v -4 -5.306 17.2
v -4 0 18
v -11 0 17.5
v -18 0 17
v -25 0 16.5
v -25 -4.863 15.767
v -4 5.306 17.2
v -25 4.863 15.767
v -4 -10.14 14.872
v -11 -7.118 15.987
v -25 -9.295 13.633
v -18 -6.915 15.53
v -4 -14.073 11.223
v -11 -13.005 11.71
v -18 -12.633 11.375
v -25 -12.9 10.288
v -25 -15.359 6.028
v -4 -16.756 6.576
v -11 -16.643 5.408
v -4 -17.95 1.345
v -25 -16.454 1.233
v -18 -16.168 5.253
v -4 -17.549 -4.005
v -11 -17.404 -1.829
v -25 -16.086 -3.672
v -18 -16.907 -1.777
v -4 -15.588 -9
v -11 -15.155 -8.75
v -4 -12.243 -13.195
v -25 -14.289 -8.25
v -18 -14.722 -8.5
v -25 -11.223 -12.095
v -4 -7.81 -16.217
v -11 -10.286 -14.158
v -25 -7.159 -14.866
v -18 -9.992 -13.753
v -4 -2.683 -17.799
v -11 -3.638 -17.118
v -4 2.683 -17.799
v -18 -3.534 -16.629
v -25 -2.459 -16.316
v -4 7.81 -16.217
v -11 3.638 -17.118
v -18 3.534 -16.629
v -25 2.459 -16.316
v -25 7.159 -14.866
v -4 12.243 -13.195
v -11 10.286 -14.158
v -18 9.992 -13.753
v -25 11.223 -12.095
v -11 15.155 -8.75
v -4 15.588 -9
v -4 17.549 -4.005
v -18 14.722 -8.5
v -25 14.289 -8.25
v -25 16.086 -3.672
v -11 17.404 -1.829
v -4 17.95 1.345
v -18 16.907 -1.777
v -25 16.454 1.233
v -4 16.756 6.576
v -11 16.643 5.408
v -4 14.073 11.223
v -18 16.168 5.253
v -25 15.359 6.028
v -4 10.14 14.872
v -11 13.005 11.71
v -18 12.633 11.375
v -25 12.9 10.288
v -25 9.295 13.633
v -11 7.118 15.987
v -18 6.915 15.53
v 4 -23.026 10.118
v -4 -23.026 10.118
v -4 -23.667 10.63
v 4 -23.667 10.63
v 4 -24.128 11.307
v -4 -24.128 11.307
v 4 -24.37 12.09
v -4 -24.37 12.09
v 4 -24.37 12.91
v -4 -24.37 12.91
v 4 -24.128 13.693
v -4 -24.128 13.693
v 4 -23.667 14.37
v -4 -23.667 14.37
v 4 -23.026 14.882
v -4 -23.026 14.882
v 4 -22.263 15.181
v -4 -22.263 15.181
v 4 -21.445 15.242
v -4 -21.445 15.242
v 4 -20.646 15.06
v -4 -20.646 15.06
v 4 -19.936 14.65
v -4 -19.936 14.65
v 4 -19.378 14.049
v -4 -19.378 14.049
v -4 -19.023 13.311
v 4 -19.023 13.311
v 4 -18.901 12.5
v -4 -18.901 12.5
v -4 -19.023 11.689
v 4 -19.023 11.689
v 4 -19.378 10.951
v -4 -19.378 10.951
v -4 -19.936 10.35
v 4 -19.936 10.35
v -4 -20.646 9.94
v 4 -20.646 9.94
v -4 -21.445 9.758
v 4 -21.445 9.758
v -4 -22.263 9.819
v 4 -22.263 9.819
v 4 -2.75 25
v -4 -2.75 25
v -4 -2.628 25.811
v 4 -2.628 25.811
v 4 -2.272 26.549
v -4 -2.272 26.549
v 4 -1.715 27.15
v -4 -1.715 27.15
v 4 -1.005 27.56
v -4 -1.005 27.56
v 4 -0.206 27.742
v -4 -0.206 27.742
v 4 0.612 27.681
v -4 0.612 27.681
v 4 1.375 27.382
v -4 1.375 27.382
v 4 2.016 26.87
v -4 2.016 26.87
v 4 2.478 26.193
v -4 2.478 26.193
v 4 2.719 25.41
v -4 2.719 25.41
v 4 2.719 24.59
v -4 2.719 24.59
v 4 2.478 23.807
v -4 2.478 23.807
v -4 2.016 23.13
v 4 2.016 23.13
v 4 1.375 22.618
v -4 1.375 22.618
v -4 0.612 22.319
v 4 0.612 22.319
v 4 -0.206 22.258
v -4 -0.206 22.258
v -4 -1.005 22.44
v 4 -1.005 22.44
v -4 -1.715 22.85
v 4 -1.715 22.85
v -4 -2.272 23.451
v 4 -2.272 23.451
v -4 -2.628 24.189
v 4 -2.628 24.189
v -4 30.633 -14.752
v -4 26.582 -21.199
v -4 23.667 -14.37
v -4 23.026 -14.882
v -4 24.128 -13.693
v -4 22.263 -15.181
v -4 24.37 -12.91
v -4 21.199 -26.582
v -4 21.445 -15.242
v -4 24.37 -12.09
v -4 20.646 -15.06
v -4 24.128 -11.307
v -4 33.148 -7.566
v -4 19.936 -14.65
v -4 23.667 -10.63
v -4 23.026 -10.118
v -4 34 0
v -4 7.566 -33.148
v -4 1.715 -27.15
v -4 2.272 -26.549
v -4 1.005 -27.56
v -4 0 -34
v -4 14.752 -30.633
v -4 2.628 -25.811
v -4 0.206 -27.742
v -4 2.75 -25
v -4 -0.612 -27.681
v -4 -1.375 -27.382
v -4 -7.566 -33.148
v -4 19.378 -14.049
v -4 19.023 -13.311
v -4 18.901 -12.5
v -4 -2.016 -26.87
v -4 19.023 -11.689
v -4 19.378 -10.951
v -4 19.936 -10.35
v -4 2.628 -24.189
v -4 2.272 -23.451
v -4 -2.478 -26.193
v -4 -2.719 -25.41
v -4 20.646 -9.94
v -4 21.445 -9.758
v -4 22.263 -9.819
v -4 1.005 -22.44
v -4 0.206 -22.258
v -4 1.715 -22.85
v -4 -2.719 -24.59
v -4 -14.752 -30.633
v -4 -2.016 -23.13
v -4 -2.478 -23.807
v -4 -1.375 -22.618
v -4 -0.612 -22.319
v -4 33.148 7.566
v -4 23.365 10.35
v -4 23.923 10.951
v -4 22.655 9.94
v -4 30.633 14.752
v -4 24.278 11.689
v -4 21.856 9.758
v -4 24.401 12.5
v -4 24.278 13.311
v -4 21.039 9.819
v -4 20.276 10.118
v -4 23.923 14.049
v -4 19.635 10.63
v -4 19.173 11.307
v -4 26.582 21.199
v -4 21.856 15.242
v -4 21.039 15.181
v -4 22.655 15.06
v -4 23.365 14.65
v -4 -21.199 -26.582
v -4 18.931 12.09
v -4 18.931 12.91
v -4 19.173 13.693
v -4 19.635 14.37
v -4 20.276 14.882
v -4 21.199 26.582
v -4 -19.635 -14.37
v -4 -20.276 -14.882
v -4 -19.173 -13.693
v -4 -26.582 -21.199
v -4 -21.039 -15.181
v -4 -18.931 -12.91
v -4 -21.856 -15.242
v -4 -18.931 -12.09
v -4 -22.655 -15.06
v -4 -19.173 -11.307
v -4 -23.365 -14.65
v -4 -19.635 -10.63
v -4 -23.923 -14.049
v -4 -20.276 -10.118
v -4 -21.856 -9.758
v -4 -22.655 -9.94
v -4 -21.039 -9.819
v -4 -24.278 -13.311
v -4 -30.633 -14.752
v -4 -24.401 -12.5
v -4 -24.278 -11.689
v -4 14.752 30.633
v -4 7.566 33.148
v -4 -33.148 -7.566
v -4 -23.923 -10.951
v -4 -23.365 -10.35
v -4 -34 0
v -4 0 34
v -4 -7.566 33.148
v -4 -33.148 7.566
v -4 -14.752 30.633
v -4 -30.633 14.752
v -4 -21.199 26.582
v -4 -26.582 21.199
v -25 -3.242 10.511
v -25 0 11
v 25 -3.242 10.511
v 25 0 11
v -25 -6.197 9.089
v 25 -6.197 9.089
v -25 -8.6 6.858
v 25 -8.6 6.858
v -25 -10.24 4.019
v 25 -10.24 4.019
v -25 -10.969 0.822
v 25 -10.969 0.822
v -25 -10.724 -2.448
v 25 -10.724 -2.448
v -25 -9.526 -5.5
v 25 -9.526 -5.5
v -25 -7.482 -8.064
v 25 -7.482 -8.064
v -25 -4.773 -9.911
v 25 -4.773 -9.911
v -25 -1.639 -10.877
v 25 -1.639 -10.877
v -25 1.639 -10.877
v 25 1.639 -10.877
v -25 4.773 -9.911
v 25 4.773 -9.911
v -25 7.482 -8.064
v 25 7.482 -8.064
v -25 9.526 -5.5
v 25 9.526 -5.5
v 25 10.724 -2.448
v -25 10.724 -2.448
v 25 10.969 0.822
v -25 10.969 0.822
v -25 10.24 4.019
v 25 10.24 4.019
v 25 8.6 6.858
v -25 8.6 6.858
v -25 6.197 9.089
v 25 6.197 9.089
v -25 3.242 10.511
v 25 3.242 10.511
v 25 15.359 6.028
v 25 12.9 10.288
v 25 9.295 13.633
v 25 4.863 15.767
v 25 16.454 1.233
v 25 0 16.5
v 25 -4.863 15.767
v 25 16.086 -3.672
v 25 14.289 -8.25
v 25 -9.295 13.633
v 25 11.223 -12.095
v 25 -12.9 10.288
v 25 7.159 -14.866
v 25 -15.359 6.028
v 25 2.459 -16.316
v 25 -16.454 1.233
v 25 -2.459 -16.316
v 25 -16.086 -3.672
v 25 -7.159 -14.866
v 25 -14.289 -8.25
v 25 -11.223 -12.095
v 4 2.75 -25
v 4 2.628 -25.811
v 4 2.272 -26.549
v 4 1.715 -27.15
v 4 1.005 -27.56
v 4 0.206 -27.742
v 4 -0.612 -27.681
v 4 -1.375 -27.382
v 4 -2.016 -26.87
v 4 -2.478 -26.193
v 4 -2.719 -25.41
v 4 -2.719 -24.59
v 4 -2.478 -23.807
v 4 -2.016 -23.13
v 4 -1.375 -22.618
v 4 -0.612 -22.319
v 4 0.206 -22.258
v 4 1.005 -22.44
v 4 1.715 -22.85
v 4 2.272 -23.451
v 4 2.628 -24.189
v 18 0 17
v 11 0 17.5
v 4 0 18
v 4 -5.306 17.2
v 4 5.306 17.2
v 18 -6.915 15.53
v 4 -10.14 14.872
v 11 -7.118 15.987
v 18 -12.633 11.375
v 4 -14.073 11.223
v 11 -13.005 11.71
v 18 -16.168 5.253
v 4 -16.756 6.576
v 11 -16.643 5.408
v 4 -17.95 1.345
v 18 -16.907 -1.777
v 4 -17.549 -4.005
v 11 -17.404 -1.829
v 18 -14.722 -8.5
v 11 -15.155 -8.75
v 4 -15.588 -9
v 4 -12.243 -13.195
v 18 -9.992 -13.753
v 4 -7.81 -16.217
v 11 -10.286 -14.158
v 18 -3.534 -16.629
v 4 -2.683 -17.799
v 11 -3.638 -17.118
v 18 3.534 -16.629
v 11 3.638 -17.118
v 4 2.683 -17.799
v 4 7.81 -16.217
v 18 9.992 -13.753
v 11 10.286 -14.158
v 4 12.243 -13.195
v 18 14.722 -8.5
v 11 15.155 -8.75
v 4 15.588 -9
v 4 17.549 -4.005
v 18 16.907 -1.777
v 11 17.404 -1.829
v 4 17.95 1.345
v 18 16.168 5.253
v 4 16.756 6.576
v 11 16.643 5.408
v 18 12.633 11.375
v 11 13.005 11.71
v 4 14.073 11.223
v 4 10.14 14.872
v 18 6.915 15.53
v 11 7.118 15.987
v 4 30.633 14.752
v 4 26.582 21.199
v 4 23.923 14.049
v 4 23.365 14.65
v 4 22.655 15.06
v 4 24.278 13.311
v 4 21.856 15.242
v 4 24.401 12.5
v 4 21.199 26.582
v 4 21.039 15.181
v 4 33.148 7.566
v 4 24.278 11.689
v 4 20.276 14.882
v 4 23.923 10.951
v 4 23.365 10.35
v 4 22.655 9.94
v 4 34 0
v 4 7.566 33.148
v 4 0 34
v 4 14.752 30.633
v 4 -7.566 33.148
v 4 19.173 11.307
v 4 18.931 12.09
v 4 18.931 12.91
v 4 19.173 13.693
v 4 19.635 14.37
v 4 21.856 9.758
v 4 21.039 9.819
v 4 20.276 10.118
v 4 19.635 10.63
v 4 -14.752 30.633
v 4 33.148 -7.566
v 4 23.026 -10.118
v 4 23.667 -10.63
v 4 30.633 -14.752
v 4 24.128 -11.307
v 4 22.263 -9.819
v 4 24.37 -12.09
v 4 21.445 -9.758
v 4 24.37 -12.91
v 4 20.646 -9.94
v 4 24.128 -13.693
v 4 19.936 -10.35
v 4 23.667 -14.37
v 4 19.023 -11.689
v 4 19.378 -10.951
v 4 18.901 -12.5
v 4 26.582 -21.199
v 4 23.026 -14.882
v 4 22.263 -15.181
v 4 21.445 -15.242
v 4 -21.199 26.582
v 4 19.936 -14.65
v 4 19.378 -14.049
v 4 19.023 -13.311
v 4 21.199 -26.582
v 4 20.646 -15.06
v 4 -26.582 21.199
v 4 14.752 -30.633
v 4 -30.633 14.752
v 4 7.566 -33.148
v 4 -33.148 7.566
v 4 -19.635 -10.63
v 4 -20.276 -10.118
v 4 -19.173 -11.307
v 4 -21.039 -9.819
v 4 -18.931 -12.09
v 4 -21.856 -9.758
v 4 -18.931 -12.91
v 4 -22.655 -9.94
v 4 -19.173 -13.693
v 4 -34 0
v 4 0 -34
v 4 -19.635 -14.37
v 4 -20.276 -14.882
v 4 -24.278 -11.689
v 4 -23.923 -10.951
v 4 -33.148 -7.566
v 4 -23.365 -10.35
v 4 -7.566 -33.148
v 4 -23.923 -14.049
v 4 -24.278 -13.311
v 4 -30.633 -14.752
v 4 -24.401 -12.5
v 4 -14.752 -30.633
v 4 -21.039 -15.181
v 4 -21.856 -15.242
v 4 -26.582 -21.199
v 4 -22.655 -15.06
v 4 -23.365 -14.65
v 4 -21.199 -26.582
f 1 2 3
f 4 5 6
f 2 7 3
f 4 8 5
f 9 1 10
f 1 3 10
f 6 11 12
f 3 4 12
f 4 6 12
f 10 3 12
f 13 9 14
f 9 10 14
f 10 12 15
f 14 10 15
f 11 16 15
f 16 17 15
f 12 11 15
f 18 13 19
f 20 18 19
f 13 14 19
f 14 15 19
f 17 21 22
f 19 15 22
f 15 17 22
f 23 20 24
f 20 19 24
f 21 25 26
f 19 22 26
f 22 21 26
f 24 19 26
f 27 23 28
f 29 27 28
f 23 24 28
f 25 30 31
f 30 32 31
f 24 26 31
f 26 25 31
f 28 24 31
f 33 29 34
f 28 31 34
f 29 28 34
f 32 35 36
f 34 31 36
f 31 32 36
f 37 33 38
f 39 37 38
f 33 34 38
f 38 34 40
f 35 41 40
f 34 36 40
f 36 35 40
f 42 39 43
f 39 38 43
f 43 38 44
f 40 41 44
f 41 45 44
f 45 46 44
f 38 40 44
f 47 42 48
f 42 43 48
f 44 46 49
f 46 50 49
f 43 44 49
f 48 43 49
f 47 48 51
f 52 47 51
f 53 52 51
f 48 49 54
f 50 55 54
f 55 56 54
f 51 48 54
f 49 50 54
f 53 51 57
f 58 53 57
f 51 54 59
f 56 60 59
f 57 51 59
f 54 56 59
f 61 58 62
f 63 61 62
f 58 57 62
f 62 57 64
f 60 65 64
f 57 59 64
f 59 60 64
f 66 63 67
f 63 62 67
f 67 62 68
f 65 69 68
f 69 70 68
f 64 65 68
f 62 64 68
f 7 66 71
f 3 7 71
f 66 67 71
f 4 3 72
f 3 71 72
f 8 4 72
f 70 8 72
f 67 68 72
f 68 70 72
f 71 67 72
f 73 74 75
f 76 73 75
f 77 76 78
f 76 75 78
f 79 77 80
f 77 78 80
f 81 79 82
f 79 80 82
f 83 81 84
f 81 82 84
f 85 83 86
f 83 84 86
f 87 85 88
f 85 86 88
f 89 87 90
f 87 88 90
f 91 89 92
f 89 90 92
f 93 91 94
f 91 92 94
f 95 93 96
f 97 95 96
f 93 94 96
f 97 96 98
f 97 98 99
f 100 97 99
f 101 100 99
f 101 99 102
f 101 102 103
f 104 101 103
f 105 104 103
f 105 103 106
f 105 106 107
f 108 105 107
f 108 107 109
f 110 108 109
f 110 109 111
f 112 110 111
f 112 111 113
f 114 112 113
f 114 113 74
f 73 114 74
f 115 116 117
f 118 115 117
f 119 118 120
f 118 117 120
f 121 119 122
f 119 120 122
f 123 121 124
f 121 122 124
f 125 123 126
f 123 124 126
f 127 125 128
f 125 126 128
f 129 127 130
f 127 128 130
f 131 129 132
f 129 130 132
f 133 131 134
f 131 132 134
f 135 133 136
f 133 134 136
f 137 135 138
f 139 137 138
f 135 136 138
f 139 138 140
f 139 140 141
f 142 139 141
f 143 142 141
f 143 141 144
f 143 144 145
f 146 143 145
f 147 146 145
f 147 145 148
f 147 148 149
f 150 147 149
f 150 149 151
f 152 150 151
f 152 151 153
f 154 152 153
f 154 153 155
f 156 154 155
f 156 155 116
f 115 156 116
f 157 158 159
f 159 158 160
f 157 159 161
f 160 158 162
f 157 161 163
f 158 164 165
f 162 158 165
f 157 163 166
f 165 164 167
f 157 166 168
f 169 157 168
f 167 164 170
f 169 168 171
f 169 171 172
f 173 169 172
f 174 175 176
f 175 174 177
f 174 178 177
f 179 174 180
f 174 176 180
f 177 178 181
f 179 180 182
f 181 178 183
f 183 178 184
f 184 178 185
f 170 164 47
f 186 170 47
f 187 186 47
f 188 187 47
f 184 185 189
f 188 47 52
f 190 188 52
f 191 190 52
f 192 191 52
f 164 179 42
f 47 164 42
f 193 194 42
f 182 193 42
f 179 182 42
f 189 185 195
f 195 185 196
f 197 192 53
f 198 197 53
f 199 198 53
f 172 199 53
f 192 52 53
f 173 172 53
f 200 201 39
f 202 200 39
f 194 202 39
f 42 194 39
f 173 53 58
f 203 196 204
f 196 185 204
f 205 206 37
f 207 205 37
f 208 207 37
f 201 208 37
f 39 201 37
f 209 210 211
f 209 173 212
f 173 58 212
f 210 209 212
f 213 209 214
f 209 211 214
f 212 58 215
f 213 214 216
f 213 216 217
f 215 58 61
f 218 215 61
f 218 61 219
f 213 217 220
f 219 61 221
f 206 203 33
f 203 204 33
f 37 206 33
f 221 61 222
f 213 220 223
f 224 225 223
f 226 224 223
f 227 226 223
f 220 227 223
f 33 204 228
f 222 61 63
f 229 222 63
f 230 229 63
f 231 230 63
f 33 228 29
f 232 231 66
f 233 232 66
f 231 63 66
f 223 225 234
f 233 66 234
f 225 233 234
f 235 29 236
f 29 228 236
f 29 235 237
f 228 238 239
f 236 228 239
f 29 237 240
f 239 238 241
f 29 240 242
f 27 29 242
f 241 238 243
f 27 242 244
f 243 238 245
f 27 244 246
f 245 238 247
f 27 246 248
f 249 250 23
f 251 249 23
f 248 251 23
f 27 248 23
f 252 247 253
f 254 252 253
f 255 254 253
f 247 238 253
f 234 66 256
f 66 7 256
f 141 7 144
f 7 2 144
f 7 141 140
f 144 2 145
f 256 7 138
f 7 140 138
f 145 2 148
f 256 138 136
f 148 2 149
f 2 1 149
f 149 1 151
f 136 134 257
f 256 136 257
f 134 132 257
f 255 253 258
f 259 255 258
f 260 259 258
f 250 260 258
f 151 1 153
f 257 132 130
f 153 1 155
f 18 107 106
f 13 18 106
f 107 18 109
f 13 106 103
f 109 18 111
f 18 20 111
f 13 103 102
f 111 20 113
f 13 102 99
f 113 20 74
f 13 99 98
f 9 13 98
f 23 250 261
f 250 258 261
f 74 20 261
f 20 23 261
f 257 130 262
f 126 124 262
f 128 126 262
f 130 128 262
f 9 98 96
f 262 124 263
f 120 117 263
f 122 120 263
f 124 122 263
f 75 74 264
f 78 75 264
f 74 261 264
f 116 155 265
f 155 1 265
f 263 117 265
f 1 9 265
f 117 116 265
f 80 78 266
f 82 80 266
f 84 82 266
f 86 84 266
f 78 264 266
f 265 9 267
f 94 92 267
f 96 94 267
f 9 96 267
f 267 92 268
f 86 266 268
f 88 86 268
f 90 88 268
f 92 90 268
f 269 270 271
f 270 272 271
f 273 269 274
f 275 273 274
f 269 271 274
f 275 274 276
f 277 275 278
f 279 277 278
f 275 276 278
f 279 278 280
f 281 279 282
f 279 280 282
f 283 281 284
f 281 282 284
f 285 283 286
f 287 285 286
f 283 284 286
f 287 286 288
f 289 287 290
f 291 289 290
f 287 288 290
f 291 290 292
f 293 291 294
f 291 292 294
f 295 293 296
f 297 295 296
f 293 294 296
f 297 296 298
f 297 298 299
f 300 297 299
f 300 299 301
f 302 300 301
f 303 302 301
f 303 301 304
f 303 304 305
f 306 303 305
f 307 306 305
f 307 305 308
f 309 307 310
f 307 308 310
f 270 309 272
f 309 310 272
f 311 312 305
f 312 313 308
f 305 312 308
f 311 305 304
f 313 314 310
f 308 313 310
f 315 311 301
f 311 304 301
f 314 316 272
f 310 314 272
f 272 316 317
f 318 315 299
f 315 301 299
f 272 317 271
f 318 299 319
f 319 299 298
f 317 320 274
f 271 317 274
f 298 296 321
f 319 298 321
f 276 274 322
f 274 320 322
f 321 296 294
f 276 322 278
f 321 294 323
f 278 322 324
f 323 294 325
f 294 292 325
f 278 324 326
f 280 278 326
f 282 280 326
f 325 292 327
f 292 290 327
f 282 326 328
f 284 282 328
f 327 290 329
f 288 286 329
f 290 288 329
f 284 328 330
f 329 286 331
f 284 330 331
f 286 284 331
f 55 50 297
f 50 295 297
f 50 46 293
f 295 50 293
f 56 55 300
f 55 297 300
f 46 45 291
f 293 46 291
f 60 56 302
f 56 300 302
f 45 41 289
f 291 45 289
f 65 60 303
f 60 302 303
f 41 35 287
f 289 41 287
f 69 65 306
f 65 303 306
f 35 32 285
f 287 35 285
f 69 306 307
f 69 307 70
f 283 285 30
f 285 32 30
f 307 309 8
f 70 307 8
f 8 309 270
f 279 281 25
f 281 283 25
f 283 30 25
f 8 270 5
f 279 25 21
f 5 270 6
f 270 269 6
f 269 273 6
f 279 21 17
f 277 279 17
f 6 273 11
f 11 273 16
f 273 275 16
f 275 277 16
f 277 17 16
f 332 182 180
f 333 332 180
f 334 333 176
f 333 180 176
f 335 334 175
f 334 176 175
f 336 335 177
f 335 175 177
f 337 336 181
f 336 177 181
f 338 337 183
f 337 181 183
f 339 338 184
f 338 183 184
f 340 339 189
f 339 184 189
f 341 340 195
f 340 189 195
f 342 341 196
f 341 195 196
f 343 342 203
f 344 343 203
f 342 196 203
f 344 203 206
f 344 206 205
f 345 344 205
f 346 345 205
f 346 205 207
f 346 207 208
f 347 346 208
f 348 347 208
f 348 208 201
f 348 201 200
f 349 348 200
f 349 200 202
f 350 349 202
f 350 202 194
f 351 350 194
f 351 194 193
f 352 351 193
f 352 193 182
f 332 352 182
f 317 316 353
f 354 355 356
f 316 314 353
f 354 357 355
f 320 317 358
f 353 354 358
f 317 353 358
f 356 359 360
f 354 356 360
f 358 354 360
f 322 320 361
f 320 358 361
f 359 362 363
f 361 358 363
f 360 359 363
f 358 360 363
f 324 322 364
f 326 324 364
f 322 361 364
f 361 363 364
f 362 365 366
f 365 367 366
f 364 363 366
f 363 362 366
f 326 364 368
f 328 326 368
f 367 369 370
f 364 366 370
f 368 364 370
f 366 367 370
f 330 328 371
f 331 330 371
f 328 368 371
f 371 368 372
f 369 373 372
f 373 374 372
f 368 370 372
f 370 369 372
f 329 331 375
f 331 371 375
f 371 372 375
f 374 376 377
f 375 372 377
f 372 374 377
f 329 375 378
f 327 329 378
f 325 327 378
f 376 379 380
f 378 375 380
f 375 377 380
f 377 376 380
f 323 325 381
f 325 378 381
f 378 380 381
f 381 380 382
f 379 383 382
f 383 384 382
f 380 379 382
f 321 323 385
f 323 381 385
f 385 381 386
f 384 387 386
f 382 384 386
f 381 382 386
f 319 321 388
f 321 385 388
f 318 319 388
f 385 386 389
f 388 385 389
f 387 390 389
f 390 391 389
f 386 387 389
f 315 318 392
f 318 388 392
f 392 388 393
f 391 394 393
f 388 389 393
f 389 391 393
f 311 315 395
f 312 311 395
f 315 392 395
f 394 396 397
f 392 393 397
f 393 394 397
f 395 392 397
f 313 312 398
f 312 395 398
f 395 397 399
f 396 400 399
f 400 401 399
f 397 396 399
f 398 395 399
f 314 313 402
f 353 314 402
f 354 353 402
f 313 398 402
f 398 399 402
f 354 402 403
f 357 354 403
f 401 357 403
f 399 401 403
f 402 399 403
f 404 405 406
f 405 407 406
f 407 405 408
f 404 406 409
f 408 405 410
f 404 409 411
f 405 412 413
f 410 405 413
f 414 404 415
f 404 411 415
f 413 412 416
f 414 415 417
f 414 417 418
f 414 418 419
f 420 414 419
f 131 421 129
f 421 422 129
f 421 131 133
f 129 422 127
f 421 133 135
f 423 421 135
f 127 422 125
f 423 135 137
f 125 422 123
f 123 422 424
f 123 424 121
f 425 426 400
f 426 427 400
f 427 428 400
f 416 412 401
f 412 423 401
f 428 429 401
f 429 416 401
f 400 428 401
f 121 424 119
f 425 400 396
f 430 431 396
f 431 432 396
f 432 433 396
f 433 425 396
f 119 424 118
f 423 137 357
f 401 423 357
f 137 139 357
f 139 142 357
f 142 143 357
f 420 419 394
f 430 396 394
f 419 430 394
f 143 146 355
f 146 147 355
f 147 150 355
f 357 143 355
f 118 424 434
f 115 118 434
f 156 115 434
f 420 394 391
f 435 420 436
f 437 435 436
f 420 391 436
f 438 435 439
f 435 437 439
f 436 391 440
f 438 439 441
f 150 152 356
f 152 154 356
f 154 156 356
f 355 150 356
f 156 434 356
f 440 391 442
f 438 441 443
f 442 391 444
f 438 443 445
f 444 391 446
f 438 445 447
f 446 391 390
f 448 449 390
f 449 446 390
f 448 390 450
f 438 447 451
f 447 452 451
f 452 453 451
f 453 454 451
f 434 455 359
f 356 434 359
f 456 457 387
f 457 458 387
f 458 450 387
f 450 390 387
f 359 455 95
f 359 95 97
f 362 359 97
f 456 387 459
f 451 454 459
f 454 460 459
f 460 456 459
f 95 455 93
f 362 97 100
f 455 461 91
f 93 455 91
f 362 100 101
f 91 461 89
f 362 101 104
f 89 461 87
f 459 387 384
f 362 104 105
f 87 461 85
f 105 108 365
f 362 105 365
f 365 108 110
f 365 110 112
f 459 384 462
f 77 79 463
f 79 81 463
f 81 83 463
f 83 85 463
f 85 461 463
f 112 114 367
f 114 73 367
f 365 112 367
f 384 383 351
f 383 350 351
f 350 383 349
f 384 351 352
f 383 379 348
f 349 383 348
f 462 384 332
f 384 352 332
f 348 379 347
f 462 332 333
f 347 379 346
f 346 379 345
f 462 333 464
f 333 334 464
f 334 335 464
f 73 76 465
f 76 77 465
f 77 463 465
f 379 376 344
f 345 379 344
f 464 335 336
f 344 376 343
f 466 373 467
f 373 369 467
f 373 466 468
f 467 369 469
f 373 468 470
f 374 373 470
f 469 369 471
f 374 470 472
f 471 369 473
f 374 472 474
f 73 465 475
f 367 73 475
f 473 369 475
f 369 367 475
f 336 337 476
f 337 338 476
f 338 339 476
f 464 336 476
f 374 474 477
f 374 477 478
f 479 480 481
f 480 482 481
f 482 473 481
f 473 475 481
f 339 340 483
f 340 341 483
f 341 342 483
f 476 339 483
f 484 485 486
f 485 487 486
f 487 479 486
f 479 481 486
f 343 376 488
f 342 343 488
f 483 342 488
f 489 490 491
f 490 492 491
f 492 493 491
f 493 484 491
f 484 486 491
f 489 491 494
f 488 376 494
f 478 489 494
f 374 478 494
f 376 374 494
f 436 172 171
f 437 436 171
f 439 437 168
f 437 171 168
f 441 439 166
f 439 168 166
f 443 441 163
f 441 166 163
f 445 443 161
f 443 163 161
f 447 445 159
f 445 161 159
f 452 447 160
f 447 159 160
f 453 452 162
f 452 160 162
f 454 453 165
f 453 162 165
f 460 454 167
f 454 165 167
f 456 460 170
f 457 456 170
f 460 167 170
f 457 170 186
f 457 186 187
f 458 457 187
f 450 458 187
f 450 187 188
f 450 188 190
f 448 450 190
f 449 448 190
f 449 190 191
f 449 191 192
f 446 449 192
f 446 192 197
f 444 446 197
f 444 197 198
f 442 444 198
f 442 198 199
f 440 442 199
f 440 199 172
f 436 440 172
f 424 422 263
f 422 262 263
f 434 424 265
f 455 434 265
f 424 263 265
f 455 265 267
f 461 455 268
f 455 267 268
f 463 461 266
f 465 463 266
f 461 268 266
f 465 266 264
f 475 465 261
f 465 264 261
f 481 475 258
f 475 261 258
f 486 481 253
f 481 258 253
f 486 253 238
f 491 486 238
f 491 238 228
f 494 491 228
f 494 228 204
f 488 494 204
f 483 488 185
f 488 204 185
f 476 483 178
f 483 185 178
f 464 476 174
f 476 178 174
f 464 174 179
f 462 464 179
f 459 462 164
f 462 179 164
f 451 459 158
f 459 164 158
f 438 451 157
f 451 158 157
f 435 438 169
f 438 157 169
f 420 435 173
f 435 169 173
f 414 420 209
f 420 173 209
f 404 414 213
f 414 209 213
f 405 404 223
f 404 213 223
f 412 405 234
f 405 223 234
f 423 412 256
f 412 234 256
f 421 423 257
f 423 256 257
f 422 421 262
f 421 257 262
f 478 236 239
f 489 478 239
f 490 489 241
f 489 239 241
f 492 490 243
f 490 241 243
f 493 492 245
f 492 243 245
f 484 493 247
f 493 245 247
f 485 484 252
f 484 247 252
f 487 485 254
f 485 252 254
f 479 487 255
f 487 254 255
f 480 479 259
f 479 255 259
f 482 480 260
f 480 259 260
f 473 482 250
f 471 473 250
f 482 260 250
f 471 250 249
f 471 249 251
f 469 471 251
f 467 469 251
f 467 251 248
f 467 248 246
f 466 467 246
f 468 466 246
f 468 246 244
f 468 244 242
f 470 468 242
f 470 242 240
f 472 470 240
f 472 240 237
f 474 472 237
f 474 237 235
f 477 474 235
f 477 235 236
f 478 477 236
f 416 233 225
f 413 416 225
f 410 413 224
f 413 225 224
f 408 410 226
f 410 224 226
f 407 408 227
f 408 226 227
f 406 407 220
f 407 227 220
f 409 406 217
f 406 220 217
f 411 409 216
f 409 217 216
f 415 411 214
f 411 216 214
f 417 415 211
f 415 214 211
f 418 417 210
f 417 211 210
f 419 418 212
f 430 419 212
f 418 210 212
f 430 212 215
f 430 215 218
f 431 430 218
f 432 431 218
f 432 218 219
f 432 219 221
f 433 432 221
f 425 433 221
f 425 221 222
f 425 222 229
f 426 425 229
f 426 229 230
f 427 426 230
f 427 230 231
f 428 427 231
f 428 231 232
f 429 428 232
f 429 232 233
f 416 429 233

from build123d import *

# Parameters (mm, degrees)
F3_D            = 5.5
F3_COPIES_COUNT = 6


# Not quite as in the source:
# - a pattern or mirror of a feature is missing from the dataset's text; its kind, count and spacing are read off the source's solid


with BuildPart() as f1:
    # F0 (on Front) → F1 (revolve)
    with BuildSketch(Plane.XZ):
        Polygon((-25, 16.5), (-25, 11), (25, 11), (25, 16.5), (4, 18), (4, 34), (-4, 34), (-4, 18), align=None)
    revolve(axis=Axis((-2.8921069455, 0, 0), (1, 0, 0)))

    # F3 (through all)
    with Locations(Plane.YZ.offset(4)):
        with Locations((0, 25)):
            f3 = Hole(F3_D / 2)

    # F3_copies: F3 ×6 about axis
    f3_copies_axis = Axis((0, 0, 0), (1, 0, 0))
    for i in range(1, F3_COPIES_COUNT):
        add(f3.rotate(f3_copies_axis, i * 360 / F3_COPIES_COUNT), mode=Mode.SUBTRACT)


solid = f1.part
